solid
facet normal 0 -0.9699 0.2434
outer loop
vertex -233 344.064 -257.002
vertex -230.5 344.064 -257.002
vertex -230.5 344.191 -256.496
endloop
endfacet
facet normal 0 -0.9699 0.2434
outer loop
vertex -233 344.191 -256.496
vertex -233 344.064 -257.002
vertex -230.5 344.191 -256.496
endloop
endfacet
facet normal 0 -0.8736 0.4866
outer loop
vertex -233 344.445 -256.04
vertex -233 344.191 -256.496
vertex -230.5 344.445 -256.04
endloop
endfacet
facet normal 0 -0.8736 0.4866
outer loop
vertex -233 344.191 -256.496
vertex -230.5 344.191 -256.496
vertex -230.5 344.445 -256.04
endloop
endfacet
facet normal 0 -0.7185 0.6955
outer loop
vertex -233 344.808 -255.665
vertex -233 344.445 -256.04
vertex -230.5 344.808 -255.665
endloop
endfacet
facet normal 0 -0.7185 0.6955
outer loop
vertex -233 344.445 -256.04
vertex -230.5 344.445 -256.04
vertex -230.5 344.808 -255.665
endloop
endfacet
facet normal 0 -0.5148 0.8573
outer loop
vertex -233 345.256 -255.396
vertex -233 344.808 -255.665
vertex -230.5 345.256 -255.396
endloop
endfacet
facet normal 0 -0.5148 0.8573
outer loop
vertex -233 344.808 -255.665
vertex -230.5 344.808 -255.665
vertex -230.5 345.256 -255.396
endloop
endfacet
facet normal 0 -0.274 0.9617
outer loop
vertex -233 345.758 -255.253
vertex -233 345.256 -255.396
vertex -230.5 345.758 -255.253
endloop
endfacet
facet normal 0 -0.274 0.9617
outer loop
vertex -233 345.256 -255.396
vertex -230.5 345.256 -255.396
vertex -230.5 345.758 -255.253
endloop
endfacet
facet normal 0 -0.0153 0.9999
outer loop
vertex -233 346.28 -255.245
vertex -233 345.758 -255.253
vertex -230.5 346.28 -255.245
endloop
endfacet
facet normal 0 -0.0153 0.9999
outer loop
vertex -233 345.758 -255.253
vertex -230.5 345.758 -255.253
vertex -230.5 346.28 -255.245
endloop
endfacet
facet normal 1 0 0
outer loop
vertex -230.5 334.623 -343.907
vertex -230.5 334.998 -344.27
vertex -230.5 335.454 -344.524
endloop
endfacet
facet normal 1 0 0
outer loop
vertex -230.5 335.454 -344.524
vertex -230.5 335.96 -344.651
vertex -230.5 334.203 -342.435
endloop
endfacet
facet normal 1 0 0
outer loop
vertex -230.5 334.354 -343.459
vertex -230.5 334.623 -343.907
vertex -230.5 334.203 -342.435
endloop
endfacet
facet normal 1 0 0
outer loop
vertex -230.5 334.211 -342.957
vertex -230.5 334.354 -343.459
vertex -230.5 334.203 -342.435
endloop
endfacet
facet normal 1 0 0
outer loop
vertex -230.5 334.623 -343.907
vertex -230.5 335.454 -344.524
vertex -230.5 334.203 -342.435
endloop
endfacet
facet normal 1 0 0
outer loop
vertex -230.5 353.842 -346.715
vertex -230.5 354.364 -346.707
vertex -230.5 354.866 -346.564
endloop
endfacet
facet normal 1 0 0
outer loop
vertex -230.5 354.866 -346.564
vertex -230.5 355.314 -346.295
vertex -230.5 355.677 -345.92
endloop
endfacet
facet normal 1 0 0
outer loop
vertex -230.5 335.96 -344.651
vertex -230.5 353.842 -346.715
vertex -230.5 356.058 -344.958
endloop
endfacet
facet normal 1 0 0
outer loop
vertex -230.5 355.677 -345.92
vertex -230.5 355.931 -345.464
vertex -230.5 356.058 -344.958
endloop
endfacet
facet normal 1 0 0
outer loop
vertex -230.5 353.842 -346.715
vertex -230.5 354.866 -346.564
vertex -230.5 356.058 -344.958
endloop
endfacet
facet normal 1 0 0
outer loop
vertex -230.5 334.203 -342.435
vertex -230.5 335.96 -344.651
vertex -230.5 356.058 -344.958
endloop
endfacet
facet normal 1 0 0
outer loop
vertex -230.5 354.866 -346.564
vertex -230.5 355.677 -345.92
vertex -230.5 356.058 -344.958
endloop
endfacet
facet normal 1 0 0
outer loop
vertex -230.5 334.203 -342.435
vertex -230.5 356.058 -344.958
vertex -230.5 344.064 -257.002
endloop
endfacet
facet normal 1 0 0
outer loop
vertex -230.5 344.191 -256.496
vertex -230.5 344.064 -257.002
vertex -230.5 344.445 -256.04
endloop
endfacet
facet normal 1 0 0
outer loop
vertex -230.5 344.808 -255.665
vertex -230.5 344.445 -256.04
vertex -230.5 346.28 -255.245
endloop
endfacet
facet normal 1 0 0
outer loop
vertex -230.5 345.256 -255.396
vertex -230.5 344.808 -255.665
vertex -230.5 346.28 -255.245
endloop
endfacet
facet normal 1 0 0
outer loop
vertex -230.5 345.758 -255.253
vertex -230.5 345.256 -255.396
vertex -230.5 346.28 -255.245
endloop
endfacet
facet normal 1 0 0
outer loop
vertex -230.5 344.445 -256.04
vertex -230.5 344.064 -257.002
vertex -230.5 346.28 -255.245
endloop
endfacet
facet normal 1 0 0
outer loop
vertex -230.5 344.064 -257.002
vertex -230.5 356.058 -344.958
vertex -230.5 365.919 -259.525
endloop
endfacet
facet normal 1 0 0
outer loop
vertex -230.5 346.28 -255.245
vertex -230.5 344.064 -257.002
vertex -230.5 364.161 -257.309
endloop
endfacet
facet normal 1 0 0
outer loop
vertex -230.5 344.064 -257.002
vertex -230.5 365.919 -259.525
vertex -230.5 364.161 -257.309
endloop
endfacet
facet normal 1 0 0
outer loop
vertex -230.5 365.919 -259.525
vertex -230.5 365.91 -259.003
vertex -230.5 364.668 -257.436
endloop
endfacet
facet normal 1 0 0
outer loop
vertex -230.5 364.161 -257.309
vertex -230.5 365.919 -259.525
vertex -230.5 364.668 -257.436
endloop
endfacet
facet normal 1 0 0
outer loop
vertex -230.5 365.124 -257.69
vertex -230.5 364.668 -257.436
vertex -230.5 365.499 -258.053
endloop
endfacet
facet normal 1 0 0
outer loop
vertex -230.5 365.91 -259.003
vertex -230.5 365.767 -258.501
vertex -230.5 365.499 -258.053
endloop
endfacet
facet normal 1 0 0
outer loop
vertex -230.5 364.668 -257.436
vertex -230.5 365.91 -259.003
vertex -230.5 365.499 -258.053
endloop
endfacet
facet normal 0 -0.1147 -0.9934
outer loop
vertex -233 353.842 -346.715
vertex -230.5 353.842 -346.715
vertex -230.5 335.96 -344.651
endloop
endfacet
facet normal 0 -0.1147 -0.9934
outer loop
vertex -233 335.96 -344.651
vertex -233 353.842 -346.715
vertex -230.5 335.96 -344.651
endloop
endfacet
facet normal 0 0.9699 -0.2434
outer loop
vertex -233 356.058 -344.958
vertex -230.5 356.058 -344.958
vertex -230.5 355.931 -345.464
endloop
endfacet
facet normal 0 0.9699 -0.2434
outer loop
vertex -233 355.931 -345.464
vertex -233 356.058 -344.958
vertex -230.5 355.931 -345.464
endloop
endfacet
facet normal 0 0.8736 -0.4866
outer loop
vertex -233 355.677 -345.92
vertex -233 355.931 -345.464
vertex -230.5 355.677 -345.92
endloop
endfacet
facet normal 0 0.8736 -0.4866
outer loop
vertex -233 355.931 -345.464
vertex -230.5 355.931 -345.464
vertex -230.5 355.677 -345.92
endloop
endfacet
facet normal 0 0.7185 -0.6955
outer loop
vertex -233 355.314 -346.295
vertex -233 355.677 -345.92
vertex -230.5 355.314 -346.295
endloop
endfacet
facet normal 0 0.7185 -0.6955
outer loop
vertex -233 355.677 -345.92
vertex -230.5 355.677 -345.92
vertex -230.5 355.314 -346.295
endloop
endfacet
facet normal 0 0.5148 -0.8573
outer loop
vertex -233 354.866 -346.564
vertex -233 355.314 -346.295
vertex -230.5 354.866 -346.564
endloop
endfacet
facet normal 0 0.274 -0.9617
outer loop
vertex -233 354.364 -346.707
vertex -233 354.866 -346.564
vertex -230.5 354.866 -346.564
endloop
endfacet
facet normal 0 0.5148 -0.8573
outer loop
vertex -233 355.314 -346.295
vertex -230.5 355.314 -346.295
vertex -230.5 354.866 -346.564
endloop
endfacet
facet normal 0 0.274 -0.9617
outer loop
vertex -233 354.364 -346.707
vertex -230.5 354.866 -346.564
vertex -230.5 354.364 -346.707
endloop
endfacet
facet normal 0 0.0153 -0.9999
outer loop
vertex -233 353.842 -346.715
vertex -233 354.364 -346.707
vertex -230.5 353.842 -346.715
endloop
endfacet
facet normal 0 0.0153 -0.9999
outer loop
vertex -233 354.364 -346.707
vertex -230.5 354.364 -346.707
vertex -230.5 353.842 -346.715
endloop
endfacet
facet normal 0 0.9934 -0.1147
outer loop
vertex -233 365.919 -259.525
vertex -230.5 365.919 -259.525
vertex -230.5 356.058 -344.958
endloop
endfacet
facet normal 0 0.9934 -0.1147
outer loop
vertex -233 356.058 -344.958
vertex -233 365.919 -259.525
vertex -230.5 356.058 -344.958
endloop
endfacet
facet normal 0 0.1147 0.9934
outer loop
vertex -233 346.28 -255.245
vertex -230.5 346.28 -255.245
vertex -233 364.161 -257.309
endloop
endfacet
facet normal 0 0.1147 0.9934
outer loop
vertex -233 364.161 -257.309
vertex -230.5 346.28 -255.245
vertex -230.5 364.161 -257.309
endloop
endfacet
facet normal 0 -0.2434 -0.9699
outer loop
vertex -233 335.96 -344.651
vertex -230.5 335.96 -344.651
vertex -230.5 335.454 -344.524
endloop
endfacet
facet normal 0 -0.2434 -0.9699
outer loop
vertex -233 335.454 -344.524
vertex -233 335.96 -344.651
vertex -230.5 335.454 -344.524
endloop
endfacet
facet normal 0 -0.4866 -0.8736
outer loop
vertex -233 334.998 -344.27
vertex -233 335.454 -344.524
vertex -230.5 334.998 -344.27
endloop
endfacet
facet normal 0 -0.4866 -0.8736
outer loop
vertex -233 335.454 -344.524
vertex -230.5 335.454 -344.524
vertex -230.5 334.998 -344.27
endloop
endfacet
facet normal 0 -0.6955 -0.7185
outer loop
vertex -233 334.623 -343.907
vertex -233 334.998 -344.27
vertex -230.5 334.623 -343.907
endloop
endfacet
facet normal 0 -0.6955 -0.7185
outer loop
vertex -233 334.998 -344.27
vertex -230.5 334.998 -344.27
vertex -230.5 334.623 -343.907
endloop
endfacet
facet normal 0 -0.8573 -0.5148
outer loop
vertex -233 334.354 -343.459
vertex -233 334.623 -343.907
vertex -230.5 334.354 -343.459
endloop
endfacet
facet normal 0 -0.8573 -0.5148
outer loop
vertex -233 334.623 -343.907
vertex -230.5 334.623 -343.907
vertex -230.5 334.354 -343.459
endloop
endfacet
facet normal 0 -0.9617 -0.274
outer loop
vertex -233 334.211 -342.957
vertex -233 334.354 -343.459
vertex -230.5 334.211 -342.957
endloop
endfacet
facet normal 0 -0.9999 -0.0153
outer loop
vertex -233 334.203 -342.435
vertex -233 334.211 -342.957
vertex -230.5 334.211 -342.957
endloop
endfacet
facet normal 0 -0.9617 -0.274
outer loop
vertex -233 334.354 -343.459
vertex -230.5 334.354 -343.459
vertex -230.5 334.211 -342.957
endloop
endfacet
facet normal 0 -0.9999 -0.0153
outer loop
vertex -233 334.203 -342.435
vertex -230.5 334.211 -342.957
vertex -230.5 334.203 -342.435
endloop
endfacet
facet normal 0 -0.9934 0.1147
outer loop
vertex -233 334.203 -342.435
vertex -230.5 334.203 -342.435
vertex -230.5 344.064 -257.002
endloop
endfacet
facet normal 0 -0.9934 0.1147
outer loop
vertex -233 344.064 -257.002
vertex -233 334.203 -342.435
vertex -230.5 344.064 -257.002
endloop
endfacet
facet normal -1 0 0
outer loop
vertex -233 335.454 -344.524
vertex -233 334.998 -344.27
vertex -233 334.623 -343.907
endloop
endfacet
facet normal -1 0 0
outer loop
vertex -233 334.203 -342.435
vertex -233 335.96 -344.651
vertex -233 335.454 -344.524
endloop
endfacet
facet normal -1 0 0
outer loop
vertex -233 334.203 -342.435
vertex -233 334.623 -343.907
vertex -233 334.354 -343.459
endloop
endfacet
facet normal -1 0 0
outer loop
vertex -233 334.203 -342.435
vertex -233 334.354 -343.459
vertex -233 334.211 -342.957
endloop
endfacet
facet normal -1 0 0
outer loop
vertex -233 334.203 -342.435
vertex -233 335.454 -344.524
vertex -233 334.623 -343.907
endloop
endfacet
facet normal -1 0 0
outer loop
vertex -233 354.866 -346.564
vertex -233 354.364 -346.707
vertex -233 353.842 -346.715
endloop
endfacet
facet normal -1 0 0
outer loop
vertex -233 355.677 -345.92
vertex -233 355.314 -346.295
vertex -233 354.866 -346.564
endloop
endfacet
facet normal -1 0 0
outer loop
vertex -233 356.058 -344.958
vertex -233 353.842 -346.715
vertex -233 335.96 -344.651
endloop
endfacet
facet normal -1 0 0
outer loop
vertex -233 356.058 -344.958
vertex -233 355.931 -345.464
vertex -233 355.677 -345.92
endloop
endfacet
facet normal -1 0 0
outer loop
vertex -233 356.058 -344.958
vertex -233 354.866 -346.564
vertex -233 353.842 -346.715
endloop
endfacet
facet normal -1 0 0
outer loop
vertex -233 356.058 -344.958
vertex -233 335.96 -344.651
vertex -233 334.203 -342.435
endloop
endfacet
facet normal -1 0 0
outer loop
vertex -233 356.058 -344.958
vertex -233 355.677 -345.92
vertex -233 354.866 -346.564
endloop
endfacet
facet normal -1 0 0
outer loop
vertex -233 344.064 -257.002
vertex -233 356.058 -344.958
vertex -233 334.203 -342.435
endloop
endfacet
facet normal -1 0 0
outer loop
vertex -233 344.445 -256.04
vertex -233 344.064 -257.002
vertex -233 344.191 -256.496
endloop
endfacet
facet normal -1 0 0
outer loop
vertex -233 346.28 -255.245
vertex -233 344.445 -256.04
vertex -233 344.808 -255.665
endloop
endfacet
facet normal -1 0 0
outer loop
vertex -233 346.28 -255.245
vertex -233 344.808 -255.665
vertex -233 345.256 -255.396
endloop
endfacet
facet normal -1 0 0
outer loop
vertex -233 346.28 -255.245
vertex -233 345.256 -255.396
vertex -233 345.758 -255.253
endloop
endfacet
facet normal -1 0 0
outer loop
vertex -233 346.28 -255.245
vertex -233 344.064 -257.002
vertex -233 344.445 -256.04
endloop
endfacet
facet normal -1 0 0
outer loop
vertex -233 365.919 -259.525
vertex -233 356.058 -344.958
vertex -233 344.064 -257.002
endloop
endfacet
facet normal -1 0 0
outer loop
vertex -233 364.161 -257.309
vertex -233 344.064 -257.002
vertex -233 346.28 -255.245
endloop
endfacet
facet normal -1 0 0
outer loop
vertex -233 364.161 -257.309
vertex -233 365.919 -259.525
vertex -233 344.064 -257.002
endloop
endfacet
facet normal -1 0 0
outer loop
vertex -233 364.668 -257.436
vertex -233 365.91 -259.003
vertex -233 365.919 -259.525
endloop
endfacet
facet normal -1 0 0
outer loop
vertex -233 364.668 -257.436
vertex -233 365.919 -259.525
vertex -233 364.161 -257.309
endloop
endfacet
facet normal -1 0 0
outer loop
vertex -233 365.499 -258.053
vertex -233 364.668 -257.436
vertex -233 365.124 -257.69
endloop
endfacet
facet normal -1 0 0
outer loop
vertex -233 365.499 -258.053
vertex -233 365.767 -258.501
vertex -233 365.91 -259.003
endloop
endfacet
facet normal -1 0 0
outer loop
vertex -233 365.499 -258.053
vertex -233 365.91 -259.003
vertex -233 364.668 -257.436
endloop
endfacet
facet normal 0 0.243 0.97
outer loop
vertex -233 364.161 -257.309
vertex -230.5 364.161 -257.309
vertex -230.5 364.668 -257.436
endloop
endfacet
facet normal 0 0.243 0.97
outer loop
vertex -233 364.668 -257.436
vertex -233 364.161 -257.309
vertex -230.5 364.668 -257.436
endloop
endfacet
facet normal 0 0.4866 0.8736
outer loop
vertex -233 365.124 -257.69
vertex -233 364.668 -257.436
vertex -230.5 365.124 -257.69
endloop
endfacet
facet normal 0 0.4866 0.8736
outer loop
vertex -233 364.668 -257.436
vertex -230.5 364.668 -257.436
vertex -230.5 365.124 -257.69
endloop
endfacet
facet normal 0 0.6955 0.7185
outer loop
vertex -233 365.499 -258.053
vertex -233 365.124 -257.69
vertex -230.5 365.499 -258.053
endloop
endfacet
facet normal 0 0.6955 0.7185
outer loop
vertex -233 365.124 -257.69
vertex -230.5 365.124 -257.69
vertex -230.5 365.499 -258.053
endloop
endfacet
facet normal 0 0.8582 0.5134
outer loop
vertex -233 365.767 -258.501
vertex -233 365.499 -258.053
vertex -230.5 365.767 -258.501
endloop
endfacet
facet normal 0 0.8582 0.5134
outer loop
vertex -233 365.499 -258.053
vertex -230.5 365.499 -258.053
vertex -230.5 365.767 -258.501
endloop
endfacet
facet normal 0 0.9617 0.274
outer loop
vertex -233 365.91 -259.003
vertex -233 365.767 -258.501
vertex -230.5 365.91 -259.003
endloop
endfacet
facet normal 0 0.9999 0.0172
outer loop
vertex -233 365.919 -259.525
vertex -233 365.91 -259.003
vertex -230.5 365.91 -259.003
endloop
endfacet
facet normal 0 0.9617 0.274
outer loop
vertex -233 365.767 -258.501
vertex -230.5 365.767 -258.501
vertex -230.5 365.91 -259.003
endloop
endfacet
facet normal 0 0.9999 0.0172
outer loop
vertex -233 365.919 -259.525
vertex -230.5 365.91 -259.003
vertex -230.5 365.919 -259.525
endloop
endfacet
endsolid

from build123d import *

# Parameters (mm, degrees)
BOSS_EXTRUDE1_DEPTH = 2.5


with BuildPart() as part:
    # Sketch1 → Boss-Extrude1 (new body)
    with BuildSketch(Plane.ZY.offset(230.5)):
        with BuildLine():
            Line((-346.715127801, 353.841707564), (-344.651242875, 335.960421843))
            ThreePointArc((-344.651242875, 335.960421843), (-343.907165724, 334.622701789), (-342.435112803, 334.202932866))
            Line((-342.435112803, 334.202932866), (-257.002303251, 344.063716401))
            ThreePointArc((-257.002303251, 344.063716401), (-255.664583196, 344.807793551), (-255.244814273, 346.279846472))
            Line((-255.244814273, 346.279846472), (-257.308699199, 364.161132193))
            ThreePointArc((-257.308699199, 364.161132193), (-258.05277635, 365.498852247), (-259.524829271, 365.91862117))
            Line((-259.524829271, 365.91862117), (-344.957638824, 356.057837635))
            ThreePointArc((-344.957638824, 356.057837635), (-346.295358878, 355.313760485), (-346.715127801, 353.841707564))
        make_face()
    extrude(amount=BOSS_EXTRUDE1_DEPTH)


solid = part.part
